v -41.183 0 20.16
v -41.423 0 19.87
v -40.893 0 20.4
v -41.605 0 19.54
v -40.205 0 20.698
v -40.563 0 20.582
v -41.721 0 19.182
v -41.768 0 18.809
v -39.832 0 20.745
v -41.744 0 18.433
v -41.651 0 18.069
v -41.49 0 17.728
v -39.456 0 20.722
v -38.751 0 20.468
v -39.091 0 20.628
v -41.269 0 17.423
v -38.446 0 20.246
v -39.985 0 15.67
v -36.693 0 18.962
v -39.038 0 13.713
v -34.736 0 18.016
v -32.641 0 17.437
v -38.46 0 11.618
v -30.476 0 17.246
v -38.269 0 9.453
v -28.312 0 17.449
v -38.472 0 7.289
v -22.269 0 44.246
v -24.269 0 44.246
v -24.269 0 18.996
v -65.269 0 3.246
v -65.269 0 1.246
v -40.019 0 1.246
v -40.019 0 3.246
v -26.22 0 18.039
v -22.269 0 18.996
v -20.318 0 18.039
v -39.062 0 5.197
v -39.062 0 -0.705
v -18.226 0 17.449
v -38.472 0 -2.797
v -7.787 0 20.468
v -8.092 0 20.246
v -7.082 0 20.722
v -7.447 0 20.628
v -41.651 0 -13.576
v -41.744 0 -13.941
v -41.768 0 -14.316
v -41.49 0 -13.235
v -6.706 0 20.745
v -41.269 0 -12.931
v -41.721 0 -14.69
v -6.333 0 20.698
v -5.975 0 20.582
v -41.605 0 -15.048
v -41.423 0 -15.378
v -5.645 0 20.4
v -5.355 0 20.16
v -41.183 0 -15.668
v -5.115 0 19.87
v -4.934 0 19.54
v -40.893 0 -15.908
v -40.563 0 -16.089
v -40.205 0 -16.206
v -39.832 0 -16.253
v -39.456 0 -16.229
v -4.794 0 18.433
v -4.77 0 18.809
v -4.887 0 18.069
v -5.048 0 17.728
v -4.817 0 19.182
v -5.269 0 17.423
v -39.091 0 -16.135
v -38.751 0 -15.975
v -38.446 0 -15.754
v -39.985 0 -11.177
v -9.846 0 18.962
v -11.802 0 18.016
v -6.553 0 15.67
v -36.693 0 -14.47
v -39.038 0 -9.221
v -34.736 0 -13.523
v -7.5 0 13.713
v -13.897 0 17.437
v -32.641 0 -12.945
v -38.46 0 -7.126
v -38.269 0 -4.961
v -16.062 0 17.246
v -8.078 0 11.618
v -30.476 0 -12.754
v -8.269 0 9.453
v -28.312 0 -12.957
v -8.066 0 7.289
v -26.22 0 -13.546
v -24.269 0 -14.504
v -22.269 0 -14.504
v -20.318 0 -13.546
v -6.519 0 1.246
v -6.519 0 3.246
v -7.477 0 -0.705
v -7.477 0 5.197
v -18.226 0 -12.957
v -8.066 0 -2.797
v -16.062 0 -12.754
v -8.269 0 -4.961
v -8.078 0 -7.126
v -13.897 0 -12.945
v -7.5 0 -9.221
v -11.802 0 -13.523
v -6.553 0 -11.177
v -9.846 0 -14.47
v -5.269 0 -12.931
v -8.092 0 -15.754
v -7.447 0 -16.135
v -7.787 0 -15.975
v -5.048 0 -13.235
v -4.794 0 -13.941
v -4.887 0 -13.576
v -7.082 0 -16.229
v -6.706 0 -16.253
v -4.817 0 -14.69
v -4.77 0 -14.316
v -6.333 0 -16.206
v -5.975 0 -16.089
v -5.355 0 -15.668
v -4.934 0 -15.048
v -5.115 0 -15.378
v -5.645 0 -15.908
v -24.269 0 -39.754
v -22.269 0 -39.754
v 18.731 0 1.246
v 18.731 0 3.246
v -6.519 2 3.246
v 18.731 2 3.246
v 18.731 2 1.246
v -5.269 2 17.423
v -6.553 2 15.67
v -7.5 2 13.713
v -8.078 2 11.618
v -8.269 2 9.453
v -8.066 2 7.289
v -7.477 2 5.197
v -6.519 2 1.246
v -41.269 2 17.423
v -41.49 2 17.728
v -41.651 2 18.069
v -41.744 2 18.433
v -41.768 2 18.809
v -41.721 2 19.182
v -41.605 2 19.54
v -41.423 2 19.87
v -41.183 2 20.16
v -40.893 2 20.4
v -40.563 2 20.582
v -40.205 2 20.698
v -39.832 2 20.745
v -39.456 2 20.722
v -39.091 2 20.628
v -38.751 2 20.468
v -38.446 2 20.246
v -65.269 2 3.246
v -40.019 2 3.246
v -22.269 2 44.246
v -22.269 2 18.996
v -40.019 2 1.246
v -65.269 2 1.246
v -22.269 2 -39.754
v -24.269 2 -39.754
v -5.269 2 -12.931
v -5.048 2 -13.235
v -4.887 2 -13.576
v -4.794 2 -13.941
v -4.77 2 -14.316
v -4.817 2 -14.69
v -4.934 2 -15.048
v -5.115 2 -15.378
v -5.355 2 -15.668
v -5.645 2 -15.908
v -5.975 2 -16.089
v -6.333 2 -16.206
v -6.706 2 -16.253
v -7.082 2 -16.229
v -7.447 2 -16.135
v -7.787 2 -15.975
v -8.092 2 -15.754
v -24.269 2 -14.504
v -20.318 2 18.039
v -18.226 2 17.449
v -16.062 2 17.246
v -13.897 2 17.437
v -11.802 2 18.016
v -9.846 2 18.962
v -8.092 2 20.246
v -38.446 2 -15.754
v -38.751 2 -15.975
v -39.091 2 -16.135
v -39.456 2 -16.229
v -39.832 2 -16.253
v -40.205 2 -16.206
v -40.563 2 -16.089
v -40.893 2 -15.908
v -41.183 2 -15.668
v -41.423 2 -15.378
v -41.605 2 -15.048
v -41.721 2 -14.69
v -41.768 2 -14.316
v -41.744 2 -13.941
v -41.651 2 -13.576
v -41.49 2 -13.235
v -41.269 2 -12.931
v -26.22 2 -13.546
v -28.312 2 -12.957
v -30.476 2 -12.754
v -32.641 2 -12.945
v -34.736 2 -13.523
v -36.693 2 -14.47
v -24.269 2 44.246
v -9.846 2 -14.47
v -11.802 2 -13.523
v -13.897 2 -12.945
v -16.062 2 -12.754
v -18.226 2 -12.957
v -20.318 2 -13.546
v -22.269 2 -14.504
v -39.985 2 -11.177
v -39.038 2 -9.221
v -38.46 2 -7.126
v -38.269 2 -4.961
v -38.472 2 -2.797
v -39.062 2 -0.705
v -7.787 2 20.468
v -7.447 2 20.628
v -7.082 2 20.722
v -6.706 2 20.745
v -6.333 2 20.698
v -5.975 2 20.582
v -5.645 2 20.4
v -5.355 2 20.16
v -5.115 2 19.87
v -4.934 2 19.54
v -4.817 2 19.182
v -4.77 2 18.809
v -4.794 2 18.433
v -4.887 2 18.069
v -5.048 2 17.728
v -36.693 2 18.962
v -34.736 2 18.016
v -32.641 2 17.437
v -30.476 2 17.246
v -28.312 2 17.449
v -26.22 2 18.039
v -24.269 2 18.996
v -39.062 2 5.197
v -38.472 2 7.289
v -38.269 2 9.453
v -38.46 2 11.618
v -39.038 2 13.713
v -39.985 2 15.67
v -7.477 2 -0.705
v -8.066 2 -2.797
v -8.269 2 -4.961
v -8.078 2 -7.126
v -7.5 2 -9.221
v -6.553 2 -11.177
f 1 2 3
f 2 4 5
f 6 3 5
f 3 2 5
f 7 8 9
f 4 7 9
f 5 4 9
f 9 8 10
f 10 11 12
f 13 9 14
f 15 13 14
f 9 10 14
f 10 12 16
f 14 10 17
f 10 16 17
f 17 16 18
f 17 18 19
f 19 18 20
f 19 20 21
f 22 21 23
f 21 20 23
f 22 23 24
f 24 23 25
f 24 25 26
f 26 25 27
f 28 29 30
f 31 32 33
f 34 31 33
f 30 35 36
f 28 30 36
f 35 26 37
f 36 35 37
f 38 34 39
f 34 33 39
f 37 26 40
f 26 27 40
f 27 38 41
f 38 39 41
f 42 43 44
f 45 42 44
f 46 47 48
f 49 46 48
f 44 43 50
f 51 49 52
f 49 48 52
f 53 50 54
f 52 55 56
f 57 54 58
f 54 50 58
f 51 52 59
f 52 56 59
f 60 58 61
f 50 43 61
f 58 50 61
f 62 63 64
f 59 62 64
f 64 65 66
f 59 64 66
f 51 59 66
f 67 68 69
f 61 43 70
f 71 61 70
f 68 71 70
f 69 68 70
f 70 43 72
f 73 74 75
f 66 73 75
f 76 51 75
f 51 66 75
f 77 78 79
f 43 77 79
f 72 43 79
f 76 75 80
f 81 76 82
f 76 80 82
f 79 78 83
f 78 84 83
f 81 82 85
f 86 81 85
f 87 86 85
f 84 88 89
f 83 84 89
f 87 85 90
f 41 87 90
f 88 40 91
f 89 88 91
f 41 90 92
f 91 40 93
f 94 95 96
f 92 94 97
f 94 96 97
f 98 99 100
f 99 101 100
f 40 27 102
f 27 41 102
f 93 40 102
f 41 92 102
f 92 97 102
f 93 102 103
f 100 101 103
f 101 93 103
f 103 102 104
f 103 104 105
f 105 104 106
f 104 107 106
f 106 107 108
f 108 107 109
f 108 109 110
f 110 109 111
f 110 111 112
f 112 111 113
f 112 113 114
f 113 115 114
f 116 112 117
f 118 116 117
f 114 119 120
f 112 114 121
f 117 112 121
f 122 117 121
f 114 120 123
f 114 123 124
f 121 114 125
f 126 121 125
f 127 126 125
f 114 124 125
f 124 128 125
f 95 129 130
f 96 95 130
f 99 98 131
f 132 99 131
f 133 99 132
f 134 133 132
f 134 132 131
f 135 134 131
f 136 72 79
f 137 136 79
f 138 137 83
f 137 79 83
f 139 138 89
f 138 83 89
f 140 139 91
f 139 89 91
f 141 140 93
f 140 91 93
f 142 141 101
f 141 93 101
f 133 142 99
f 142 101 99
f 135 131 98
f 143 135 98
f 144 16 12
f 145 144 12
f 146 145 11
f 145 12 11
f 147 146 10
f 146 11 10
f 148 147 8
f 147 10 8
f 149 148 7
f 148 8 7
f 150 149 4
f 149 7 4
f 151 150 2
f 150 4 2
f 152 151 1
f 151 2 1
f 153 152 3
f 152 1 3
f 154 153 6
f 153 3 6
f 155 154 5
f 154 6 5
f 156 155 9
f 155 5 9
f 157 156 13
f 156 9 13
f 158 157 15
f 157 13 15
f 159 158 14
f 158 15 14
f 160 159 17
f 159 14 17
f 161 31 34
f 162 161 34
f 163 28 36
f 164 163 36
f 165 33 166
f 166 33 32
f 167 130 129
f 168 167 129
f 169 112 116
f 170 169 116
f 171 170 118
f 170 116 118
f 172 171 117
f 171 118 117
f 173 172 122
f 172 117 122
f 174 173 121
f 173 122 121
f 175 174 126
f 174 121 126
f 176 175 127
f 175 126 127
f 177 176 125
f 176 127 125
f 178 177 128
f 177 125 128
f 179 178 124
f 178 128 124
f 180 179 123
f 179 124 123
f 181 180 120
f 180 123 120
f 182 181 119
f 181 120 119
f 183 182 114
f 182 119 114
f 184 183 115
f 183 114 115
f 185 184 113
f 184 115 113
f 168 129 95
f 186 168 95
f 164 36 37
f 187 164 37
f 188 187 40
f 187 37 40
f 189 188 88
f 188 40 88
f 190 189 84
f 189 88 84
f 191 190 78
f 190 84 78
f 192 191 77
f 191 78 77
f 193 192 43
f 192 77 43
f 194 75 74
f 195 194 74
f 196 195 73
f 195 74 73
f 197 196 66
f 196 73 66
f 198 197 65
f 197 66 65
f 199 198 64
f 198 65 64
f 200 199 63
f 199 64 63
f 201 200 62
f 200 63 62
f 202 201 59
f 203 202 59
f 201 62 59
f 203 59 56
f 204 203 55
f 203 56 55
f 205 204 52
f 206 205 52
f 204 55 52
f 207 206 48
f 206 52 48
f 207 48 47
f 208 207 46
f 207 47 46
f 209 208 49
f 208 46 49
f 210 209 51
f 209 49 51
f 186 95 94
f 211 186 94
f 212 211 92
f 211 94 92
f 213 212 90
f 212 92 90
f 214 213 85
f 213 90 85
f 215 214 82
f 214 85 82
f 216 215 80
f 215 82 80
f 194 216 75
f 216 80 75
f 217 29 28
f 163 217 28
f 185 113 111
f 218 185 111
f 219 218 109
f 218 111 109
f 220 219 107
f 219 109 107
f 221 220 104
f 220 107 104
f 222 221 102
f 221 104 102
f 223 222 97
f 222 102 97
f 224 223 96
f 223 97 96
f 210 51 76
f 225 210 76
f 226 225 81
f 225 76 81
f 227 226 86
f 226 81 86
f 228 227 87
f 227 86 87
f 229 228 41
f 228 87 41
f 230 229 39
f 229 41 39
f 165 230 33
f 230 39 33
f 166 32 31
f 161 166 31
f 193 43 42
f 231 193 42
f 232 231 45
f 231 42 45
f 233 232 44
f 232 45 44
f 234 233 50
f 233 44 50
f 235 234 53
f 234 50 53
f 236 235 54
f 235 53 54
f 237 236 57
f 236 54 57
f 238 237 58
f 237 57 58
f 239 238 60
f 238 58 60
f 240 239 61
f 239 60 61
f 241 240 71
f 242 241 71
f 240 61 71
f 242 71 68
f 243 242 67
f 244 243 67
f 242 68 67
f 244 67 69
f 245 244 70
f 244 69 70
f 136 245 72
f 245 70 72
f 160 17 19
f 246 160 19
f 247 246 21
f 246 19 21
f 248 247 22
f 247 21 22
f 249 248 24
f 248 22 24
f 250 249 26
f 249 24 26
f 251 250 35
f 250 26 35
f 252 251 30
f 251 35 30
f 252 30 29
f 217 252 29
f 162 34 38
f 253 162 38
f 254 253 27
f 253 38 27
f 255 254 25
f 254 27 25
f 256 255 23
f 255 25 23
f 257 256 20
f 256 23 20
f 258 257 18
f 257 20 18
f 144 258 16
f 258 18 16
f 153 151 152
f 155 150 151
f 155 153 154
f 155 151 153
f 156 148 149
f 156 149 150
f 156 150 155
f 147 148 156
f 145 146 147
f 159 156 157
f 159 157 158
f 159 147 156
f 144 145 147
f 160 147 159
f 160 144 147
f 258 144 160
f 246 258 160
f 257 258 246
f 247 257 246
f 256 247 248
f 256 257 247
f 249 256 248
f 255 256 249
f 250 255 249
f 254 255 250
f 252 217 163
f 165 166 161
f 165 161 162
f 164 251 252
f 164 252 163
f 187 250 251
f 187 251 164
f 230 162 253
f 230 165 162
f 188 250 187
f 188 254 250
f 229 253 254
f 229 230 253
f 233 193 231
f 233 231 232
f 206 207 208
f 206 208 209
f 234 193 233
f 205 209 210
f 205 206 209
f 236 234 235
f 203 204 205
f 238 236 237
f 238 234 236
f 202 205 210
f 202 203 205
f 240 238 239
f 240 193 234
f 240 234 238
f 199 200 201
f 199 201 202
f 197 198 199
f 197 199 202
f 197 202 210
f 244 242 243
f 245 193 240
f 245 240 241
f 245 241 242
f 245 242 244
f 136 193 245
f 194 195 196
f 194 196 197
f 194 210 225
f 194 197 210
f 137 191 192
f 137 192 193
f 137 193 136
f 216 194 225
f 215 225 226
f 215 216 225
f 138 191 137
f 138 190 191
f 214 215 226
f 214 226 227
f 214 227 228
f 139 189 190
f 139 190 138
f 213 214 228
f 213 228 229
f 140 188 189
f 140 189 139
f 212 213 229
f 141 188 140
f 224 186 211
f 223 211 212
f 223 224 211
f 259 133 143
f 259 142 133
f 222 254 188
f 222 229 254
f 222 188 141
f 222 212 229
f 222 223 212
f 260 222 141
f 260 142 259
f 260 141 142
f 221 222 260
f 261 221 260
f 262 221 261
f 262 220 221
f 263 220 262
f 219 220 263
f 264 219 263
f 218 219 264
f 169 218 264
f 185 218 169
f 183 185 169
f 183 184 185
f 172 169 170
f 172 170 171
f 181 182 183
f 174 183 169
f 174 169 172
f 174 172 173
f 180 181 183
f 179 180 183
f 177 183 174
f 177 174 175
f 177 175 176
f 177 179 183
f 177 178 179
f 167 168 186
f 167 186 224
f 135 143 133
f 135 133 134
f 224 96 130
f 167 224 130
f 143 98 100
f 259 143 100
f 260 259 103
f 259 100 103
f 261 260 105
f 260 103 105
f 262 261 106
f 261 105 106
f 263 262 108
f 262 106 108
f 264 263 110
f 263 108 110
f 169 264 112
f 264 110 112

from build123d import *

# Parameters (mm, degrees)
BOSS_EXTRUDE1_DEPTH = 2


with BuildPart() as part:
    # Sketch1 → Boss-Extrude1 (new body)
    with BuildSketch(Plane(origin=(0, 0, 0), x_dir=(1, 0, 0), z_dir=(0, 1, 0))):
        with BuildLine():
            Line((-65.26908877, -1.246266978), (-65.26908877, -3.246266978))
            Line((-65.26908877, -3.246266978), (-40.019014758, -3.246266978))
            ThreePointArc((-40.019014758, -3.246266978), (-38.315467936, -10.540153027), (-41.26908877, -17.423391323))
            ThreePointArc((-41.26908877, -17.423391323), (-41.183302332, -20.160480541), (-38.446213114, -20.246266978))
            ThreePointArc((-38.446213114, -20.246266978), (-31.562974818, -17.292646145), (-24.26908877, -18.996192966))
            Line((-24.26908877, -18.996192966), (-24.26908877, -44.246266978))
            Line((-24.26908877, -44.246266978), (-22.26908877, -44.246266978))
            Line((-22.26908877, -44.246266978), (-22.26908877, -18.996192966))
            ThreePointArc((-22.26908877, -18.996192966), (-14.975202721, -17.292646145), (-8.091964425, -20.246266978))
            ThreePointArc((-8.091964425, -20.246266978), (-5.354875207, -20.160480541), (-5.26908877, -17.423391323))
            ThreePointArc((-5.26908877, -17.423391323), (-8.222709603, -10.540153027), (-6.519162781, -3.246266978))
            Line((-6.519162781, -3.246266978), (18.73091123, -3.246266978))
            Line((18.73091123, -3.246266978), (18.73091123, -1.246266978))
            Line((18.73091123, -1.246266978), (-6.519162781, -1.246266978))
            ThreePointArc((-6.519162781, -1.246266978), (-8.222709603, 6.04761907), (-5.26908877, 12.930857366))
            ThreePointArc((-5.26908877, 12.930857366), (-5.354875207, 15.667946584), (-8.091964425, 15.753733022))
            ThreePointArc((-8.091964425, 15.753733022), (-14.975202721, 12.800112188), (-22.26908877, 14.50365901))
            Line((-22.26908877, 14.50365901), (-22.26908877, 39.753733022))
            Line((-22.26908877, 39.753733022), (-24.26908877, 39.753733022))
            Line((-24.26908877, 39.753733022), (-24.26908877, 14.50365901))
            ThreePointArc((-24.26908877, 14.50365901), (-31.562974818, 12.800112188), (-38.446213114, 15.753733022))
            ThreePointArc((-38.446213114, 15.753733022), (-41.183302332, 15.667946584), (-41.26908877, 12.930857366))
            ThreePointArc((-41.26908877, 12.930857366), (-38.315467936, 6.04761907), (-40.019014758, -1.246266978))
            Line((-40.019014758, -1.246266978), (-65.26908877, -1.246266978))
        make_face()
    extrude(amount=BOSS_EXTRUDE1_DEPTH)


solid = part.part
